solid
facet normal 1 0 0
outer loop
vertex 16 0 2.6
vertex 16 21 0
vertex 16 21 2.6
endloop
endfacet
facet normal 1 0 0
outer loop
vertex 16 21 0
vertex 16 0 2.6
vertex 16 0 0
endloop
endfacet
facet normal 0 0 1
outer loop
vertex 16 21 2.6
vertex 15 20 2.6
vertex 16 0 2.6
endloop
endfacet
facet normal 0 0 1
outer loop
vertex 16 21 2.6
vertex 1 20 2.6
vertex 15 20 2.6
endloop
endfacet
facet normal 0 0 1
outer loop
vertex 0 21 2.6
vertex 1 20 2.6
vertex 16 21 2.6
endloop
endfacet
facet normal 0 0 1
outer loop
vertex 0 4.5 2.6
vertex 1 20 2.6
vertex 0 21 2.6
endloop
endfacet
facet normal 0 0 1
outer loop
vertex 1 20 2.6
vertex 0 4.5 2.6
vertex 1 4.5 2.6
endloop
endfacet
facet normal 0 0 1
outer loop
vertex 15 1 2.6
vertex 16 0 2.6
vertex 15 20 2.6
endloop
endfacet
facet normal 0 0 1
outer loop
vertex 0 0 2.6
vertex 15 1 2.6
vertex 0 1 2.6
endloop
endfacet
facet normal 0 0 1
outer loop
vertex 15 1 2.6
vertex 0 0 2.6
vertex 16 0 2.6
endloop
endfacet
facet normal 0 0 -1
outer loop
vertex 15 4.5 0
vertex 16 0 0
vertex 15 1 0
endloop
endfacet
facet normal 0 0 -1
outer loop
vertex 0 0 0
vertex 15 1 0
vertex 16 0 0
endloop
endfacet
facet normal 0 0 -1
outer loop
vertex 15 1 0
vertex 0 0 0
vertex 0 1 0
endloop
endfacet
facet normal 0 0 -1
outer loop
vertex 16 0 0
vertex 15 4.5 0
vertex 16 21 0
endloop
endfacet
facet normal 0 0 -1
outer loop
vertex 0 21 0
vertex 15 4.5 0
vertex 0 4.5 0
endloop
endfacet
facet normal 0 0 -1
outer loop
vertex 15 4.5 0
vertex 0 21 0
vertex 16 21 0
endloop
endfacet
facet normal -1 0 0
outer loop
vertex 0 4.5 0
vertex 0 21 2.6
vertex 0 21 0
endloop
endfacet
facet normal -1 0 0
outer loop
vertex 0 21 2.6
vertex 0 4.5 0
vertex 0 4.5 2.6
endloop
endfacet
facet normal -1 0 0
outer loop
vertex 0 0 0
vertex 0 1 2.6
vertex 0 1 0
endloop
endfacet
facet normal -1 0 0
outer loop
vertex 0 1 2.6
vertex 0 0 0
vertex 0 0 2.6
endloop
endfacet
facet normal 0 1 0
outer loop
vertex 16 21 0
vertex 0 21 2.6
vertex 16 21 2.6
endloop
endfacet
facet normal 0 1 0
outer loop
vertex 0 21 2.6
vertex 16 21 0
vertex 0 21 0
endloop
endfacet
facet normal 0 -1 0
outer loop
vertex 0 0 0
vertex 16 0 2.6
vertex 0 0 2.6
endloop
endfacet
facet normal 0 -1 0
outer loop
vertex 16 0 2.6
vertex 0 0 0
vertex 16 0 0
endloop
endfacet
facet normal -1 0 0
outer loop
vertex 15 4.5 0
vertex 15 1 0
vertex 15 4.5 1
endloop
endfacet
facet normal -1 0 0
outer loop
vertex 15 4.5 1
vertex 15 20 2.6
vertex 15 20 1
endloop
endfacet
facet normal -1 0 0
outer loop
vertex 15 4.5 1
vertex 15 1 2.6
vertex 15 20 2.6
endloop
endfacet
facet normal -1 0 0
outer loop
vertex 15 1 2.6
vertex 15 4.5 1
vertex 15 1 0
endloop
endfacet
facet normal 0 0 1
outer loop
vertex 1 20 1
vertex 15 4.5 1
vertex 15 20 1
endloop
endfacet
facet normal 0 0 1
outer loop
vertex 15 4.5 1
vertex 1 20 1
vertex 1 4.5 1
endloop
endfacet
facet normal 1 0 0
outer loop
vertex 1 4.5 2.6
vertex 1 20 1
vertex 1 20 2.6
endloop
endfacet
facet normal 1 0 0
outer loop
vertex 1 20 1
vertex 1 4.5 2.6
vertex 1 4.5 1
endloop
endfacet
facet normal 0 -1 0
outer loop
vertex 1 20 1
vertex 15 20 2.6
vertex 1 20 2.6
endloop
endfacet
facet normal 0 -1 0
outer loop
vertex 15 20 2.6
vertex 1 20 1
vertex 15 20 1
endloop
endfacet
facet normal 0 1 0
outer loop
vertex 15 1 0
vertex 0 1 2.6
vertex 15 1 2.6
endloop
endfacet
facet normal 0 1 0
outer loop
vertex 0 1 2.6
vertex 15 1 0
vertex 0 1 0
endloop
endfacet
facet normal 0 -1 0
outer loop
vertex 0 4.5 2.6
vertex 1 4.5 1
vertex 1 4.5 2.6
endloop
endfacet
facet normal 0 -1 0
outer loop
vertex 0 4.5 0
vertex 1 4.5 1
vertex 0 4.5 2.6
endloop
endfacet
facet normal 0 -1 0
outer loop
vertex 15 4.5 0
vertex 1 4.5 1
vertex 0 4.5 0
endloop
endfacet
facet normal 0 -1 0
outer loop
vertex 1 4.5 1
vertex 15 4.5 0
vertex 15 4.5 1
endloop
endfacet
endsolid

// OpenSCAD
height = 19;
width = 14;
board_thickness = 1.6;
bottom_space = 3.5;

thickness = 1;

difference() {
    cube([width + thickness * 2, height + thickness * 2, board_thickness + thickness]);
    translate([thickness, thickness, thickness])
        cube([width, height, board_thickness]);
    translate([0, thickness, 0])
        cube([width + thickness, bottom_space, thickness + board_thickness]);
}
